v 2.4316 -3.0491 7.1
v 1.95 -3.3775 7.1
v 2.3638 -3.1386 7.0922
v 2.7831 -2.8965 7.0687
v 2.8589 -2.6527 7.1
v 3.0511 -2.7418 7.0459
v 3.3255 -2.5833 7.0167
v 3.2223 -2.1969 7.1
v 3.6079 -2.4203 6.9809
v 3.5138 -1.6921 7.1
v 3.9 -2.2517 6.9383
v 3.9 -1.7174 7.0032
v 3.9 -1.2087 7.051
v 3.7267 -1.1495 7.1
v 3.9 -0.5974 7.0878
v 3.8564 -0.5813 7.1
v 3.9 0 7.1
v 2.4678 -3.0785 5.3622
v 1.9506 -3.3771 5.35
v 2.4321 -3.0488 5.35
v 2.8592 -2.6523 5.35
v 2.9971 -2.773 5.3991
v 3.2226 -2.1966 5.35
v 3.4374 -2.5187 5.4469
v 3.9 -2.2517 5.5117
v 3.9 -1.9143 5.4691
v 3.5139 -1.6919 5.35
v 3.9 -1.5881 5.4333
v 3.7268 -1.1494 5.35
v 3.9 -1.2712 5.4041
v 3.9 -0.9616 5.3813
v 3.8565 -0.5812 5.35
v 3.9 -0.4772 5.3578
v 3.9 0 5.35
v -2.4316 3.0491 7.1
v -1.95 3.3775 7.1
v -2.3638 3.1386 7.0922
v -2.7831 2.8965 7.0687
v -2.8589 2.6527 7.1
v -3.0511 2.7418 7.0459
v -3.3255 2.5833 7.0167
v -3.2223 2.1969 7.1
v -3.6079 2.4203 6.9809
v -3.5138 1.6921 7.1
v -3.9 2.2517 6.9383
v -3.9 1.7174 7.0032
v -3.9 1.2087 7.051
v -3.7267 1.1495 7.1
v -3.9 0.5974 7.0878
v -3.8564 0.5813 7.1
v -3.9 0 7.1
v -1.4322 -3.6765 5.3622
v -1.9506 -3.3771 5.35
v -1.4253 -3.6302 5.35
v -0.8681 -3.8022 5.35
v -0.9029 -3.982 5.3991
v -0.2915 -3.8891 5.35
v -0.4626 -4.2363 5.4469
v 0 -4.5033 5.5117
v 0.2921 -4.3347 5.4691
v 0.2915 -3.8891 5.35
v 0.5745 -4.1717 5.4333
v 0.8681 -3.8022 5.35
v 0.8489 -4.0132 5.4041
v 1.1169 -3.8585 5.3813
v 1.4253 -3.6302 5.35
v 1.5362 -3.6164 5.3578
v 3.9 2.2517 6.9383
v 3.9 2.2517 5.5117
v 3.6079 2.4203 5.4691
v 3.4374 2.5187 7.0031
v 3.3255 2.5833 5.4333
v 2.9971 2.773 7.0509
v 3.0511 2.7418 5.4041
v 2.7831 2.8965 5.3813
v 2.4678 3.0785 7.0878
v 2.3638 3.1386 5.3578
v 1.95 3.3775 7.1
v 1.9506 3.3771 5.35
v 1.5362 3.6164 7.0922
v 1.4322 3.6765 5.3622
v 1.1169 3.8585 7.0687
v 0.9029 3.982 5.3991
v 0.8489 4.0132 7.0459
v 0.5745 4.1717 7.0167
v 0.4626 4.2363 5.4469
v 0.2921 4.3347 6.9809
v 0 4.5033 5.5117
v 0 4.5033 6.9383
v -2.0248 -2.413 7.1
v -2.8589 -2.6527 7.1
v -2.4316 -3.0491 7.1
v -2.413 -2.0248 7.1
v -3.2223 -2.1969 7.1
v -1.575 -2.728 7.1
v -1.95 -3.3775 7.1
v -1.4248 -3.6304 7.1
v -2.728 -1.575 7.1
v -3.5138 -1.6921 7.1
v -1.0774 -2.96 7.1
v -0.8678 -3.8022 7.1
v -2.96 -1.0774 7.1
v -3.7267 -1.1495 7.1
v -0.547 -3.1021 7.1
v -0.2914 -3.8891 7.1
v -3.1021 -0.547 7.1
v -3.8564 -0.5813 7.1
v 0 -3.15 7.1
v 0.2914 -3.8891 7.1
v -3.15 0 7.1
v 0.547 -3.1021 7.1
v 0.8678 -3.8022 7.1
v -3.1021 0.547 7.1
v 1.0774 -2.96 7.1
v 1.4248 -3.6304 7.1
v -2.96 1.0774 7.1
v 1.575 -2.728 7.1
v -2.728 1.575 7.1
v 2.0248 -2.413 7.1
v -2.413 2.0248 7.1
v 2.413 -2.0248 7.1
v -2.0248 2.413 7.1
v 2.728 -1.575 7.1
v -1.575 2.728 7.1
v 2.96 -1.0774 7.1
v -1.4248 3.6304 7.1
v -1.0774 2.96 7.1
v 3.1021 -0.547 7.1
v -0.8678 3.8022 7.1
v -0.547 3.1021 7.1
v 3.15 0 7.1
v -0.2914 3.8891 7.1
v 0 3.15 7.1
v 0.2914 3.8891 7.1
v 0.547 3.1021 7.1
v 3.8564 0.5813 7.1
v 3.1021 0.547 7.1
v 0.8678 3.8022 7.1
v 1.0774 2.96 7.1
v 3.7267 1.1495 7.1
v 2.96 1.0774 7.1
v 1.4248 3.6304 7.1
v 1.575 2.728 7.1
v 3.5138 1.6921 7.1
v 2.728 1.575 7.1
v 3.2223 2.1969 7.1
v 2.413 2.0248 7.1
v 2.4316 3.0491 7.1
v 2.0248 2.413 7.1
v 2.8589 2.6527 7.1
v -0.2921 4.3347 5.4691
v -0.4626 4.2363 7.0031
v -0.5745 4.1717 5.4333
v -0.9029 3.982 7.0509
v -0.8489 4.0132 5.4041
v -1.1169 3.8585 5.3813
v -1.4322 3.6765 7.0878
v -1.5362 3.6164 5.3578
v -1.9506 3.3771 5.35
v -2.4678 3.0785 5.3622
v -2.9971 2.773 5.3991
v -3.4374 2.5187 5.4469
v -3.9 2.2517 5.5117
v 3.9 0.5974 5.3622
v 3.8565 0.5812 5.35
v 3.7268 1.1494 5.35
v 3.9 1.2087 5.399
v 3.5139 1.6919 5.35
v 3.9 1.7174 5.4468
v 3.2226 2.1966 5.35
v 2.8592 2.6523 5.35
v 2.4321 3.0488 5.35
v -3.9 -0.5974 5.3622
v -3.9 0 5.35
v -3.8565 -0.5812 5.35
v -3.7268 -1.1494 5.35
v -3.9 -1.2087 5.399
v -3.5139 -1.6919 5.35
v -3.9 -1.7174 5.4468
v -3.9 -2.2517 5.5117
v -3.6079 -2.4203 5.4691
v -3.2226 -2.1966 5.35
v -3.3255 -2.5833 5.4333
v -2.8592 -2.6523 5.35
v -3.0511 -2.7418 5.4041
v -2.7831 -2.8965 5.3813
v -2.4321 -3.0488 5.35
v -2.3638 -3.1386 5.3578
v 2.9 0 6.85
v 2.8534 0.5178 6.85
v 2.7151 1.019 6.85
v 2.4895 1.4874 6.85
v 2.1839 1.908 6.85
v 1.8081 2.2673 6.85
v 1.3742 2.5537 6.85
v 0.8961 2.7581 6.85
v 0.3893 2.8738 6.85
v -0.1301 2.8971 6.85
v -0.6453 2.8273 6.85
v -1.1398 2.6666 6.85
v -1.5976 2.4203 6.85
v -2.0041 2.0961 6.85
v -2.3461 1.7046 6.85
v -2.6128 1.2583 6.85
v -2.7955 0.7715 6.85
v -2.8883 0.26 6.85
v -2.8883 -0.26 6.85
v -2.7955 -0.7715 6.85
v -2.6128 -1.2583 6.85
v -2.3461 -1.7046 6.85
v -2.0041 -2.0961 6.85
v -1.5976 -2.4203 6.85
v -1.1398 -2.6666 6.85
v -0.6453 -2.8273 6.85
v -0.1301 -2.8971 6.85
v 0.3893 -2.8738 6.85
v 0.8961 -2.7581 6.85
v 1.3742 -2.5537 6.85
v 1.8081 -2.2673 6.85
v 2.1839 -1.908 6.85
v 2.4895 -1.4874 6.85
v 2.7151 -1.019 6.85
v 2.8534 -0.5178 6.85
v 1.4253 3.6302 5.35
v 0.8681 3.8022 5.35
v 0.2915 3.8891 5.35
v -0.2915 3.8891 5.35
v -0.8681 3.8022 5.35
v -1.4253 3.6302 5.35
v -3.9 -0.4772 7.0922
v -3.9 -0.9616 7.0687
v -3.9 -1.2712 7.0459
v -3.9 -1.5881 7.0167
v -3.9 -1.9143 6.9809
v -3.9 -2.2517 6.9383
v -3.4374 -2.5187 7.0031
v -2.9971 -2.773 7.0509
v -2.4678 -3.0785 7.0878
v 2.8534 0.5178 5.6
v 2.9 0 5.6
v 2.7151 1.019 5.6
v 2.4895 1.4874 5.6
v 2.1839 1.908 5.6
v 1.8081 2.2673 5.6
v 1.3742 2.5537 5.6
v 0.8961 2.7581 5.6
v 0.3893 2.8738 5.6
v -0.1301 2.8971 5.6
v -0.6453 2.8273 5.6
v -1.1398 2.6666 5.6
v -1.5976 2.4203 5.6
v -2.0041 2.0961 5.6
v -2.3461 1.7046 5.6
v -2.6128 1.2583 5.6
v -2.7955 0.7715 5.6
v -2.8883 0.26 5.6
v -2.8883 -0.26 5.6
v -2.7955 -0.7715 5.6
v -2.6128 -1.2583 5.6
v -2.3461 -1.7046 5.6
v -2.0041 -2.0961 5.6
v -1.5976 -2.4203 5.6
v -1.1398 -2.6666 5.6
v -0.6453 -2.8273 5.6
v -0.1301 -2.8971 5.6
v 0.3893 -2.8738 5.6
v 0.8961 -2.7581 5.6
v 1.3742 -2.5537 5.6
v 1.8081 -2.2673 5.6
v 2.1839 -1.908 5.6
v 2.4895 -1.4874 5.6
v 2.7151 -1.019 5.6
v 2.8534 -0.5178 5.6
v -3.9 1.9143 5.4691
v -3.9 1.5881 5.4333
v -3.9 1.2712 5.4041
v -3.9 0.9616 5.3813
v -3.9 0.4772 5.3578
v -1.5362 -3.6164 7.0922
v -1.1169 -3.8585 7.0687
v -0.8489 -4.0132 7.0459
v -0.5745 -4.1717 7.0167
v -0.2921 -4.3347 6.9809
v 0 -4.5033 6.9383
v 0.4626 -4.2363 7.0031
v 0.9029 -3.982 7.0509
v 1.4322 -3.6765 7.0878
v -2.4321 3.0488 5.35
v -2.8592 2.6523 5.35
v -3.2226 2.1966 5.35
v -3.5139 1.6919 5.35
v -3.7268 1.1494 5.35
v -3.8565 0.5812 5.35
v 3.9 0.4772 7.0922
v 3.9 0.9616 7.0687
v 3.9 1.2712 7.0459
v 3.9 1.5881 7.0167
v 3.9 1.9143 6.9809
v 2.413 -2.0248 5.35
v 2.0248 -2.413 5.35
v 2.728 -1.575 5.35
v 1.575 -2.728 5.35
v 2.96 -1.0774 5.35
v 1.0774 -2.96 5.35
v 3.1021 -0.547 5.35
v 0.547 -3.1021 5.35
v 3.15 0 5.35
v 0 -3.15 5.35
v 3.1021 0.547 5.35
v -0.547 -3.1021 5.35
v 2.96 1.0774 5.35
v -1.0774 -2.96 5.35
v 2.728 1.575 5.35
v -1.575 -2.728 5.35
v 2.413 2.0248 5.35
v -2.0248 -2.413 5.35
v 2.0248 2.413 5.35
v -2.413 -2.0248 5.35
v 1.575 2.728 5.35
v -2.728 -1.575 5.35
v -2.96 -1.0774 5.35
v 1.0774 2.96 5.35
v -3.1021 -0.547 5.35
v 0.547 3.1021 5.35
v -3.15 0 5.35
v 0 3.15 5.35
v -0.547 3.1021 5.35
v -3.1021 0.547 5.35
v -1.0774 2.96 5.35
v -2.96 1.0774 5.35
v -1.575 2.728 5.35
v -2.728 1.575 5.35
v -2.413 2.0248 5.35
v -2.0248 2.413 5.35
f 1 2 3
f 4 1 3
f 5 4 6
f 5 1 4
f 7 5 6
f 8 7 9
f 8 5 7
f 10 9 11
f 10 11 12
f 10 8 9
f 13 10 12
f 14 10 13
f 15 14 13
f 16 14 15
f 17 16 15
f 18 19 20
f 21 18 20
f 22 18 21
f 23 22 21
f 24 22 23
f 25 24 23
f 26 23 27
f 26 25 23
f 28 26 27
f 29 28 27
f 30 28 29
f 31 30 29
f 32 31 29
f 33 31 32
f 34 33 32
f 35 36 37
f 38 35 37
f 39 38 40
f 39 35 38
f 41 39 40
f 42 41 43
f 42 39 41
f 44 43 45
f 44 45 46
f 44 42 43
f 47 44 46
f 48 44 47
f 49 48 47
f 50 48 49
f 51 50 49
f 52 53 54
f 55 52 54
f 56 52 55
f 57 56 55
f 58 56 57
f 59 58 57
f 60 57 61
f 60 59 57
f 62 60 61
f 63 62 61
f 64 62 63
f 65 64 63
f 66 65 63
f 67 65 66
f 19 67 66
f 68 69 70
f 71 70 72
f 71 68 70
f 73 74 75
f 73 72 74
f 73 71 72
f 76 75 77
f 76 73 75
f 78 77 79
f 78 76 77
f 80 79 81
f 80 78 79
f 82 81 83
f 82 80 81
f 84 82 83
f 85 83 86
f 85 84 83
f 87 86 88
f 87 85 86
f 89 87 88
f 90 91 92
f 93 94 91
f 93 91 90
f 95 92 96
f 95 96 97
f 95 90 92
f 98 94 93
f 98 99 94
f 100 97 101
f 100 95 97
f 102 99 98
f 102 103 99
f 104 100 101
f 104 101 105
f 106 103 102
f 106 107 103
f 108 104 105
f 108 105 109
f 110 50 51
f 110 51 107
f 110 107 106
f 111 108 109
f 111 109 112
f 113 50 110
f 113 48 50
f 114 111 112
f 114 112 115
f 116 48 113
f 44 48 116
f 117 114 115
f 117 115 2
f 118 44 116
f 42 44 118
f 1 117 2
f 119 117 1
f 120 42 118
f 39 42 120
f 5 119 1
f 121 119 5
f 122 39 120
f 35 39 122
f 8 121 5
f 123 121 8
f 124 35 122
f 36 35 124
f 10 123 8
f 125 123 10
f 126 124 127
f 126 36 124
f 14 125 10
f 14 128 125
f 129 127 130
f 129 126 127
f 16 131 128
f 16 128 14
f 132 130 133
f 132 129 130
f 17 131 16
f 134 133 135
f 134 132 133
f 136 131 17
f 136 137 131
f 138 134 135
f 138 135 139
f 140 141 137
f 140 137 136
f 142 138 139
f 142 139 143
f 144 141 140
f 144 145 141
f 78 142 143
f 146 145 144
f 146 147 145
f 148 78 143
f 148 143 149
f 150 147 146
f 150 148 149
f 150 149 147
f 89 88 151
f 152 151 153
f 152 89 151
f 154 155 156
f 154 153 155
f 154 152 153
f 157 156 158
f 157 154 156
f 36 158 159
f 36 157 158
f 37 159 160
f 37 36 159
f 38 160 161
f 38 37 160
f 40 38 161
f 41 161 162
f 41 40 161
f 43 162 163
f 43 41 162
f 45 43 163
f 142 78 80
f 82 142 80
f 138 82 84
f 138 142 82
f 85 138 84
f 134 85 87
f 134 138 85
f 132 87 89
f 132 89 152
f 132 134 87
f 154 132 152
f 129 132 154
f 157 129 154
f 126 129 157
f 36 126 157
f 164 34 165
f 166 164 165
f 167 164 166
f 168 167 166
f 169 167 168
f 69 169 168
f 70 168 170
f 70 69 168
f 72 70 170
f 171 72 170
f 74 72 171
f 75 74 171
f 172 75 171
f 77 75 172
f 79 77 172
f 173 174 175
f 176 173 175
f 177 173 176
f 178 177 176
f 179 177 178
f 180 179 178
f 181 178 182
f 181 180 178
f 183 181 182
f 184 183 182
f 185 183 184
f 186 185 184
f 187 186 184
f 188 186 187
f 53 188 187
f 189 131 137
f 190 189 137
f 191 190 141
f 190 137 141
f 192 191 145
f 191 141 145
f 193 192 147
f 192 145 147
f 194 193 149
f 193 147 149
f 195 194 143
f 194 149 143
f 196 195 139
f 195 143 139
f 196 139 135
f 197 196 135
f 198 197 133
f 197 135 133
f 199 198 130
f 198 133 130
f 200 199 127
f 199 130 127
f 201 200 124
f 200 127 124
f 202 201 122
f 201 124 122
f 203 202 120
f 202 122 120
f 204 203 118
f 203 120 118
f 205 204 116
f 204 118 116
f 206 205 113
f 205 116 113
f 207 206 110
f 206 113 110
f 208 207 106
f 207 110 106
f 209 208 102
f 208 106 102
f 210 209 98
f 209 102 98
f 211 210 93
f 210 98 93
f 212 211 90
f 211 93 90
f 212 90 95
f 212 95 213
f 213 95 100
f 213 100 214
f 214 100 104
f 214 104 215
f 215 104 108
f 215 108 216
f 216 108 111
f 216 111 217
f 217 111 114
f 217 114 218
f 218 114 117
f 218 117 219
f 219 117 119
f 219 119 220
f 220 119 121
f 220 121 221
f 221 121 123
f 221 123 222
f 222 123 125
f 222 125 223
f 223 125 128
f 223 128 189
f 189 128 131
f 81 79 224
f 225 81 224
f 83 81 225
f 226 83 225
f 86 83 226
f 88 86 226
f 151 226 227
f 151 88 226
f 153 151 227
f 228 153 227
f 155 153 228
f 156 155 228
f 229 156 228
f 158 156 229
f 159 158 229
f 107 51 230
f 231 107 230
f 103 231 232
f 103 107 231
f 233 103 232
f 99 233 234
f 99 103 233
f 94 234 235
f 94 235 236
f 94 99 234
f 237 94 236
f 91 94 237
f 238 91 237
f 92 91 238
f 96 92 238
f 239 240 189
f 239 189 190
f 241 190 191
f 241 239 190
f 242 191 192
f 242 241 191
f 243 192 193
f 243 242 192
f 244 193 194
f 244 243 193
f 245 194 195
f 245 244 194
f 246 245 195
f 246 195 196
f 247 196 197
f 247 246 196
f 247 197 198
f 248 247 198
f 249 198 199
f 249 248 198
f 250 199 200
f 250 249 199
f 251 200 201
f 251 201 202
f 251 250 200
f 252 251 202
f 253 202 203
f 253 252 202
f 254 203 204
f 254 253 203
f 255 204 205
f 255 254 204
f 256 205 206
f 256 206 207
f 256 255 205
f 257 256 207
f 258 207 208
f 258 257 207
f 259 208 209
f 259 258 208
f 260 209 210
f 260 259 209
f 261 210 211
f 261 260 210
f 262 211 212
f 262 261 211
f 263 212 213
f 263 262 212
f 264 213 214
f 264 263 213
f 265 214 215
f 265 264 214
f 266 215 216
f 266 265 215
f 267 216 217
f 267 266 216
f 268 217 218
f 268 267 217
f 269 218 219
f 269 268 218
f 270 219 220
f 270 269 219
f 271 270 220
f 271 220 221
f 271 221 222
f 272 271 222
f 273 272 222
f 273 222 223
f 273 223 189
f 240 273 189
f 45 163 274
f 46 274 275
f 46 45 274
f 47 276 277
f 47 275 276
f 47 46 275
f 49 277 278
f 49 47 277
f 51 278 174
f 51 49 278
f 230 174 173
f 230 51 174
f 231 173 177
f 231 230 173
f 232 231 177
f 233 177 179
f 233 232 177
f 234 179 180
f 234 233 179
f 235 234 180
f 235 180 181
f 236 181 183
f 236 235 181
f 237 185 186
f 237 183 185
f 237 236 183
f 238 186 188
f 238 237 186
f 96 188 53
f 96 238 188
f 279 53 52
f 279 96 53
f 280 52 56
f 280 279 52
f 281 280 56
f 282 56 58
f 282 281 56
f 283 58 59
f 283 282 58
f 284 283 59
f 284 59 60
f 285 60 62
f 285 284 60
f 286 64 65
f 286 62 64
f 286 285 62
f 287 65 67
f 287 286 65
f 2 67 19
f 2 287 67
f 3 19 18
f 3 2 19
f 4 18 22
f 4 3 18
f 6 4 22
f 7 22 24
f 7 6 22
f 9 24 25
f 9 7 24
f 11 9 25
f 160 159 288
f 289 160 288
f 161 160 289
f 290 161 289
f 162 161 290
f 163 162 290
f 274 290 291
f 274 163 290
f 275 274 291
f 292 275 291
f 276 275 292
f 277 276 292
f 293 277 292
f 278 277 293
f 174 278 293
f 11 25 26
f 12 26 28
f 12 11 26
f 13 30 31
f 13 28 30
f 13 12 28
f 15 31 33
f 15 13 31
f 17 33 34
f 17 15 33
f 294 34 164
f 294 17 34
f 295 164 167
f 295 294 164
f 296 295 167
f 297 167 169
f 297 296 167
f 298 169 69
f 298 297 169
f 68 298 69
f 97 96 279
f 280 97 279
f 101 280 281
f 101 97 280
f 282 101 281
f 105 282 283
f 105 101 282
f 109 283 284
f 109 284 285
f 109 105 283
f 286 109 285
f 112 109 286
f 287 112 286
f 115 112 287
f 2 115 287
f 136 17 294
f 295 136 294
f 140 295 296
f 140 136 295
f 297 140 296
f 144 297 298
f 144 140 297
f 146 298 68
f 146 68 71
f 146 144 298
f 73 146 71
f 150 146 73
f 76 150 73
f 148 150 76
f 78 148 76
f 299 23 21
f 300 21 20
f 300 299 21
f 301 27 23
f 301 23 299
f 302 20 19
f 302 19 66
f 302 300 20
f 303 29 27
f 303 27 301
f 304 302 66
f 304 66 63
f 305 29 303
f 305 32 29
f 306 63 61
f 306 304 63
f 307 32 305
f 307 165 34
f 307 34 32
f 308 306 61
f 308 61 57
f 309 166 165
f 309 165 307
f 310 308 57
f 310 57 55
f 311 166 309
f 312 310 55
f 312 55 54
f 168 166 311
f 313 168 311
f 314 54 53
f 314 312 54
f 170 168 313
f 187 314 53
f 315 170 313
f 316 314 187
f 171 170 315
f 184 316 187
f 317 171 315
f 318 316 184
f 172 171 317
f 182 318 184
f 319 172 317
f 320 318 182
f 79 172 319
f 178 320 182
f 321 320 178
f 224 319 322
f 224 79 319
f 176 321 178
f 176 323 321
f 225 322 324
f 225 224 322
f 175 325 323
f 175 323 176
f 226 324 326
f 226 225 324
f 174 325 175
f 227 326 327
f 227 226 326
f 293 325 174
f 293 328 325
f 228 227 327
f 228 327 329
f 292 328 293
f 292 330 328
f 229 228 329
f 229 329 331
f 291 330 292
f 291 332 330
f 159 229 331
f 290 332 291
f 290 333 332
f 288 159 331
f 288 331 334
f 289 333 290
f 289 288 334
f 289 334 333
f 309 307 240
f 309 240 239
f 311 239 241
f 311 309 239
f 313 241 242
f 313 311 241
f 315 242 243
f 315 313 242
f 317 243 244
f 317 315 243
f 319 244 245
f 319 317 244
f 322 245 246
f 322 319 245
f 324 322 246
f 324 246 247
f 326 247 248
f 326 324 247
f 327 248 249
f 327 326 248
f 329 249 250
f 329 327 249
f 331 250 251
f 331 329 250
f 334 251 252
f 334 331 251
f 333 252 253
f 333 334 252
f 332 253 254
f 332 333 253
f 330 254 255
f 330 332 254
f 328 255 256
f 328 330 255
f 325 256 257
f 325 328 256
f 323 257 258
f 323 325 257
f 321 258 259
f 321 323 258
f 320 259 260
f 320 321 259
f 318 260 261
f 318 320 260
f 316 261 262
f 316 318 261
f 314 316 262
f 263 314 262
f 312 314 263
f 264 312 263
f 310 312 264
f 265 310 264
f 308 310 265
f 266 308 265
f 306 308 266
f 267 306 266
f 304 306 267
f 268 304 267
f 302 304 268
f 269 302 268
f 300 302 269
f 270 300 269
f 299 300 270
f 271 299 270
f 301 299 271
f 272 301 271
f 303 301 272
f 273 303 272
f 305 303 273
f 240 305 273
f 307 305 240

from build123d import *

# Parameters (mm, degrees)
SKETCH013_R     = 8.20375
POCKET004_DEPTH = 5
CHAMFER001_SIZE = 0.25


with BuildPart() as part:
    # Sketch012 → Revolution001 (revolve)
    with BuildSketch(Plane.XZ):
        Polygon((2.9, 0.875), (2.9, -0.875), (3.9, -0.875), (7.165544, 0), (3.9, 0.875), align=None)
    revolve(axis=Axis((0, 0, 0), (0, 0, 1)))

    # Sketch013 (on Face5 of Revolution001) → Pocket004 (cut)
    with BuildSketch(Plane(origin=(0, 0, 0.875), x_dir=(-1, 0, 0), z_dir=(0, 0, 1))):
        Circle(SKETCH013_R)
        Polygon((0, 4.503332), (-3.9, 2.251666), (-3.9, -2.251666), (0, -4.503332), (3.9, -2.251666), (3.9, 2.251666), align=None, mode=Mode.SUBTRACT)
    extrude(amount=-POCKET004_DEPTH, mode=Mode.SUBTRACT)

    # Chamfer001
    chamfer001_edges = [part.edges().sort_by_distance(p)[0] for p in [
        (-2.9, 0, -0.875),
        (-2.9, 0, 0.875),
    ]]
    chamfer(chamfer001_edges, length=CHAMFER001_SIZE)


with BuildPart() as part_1:
    # Body003 placement: moved
    add(part.part.moved(Location((0, 0, 0.875))))


with BuildPart() as part_2:
    # Body004 placement: moved
    add(part_1.part.moved(Location((0, 0, 5.35))))


solid = part_2.part
